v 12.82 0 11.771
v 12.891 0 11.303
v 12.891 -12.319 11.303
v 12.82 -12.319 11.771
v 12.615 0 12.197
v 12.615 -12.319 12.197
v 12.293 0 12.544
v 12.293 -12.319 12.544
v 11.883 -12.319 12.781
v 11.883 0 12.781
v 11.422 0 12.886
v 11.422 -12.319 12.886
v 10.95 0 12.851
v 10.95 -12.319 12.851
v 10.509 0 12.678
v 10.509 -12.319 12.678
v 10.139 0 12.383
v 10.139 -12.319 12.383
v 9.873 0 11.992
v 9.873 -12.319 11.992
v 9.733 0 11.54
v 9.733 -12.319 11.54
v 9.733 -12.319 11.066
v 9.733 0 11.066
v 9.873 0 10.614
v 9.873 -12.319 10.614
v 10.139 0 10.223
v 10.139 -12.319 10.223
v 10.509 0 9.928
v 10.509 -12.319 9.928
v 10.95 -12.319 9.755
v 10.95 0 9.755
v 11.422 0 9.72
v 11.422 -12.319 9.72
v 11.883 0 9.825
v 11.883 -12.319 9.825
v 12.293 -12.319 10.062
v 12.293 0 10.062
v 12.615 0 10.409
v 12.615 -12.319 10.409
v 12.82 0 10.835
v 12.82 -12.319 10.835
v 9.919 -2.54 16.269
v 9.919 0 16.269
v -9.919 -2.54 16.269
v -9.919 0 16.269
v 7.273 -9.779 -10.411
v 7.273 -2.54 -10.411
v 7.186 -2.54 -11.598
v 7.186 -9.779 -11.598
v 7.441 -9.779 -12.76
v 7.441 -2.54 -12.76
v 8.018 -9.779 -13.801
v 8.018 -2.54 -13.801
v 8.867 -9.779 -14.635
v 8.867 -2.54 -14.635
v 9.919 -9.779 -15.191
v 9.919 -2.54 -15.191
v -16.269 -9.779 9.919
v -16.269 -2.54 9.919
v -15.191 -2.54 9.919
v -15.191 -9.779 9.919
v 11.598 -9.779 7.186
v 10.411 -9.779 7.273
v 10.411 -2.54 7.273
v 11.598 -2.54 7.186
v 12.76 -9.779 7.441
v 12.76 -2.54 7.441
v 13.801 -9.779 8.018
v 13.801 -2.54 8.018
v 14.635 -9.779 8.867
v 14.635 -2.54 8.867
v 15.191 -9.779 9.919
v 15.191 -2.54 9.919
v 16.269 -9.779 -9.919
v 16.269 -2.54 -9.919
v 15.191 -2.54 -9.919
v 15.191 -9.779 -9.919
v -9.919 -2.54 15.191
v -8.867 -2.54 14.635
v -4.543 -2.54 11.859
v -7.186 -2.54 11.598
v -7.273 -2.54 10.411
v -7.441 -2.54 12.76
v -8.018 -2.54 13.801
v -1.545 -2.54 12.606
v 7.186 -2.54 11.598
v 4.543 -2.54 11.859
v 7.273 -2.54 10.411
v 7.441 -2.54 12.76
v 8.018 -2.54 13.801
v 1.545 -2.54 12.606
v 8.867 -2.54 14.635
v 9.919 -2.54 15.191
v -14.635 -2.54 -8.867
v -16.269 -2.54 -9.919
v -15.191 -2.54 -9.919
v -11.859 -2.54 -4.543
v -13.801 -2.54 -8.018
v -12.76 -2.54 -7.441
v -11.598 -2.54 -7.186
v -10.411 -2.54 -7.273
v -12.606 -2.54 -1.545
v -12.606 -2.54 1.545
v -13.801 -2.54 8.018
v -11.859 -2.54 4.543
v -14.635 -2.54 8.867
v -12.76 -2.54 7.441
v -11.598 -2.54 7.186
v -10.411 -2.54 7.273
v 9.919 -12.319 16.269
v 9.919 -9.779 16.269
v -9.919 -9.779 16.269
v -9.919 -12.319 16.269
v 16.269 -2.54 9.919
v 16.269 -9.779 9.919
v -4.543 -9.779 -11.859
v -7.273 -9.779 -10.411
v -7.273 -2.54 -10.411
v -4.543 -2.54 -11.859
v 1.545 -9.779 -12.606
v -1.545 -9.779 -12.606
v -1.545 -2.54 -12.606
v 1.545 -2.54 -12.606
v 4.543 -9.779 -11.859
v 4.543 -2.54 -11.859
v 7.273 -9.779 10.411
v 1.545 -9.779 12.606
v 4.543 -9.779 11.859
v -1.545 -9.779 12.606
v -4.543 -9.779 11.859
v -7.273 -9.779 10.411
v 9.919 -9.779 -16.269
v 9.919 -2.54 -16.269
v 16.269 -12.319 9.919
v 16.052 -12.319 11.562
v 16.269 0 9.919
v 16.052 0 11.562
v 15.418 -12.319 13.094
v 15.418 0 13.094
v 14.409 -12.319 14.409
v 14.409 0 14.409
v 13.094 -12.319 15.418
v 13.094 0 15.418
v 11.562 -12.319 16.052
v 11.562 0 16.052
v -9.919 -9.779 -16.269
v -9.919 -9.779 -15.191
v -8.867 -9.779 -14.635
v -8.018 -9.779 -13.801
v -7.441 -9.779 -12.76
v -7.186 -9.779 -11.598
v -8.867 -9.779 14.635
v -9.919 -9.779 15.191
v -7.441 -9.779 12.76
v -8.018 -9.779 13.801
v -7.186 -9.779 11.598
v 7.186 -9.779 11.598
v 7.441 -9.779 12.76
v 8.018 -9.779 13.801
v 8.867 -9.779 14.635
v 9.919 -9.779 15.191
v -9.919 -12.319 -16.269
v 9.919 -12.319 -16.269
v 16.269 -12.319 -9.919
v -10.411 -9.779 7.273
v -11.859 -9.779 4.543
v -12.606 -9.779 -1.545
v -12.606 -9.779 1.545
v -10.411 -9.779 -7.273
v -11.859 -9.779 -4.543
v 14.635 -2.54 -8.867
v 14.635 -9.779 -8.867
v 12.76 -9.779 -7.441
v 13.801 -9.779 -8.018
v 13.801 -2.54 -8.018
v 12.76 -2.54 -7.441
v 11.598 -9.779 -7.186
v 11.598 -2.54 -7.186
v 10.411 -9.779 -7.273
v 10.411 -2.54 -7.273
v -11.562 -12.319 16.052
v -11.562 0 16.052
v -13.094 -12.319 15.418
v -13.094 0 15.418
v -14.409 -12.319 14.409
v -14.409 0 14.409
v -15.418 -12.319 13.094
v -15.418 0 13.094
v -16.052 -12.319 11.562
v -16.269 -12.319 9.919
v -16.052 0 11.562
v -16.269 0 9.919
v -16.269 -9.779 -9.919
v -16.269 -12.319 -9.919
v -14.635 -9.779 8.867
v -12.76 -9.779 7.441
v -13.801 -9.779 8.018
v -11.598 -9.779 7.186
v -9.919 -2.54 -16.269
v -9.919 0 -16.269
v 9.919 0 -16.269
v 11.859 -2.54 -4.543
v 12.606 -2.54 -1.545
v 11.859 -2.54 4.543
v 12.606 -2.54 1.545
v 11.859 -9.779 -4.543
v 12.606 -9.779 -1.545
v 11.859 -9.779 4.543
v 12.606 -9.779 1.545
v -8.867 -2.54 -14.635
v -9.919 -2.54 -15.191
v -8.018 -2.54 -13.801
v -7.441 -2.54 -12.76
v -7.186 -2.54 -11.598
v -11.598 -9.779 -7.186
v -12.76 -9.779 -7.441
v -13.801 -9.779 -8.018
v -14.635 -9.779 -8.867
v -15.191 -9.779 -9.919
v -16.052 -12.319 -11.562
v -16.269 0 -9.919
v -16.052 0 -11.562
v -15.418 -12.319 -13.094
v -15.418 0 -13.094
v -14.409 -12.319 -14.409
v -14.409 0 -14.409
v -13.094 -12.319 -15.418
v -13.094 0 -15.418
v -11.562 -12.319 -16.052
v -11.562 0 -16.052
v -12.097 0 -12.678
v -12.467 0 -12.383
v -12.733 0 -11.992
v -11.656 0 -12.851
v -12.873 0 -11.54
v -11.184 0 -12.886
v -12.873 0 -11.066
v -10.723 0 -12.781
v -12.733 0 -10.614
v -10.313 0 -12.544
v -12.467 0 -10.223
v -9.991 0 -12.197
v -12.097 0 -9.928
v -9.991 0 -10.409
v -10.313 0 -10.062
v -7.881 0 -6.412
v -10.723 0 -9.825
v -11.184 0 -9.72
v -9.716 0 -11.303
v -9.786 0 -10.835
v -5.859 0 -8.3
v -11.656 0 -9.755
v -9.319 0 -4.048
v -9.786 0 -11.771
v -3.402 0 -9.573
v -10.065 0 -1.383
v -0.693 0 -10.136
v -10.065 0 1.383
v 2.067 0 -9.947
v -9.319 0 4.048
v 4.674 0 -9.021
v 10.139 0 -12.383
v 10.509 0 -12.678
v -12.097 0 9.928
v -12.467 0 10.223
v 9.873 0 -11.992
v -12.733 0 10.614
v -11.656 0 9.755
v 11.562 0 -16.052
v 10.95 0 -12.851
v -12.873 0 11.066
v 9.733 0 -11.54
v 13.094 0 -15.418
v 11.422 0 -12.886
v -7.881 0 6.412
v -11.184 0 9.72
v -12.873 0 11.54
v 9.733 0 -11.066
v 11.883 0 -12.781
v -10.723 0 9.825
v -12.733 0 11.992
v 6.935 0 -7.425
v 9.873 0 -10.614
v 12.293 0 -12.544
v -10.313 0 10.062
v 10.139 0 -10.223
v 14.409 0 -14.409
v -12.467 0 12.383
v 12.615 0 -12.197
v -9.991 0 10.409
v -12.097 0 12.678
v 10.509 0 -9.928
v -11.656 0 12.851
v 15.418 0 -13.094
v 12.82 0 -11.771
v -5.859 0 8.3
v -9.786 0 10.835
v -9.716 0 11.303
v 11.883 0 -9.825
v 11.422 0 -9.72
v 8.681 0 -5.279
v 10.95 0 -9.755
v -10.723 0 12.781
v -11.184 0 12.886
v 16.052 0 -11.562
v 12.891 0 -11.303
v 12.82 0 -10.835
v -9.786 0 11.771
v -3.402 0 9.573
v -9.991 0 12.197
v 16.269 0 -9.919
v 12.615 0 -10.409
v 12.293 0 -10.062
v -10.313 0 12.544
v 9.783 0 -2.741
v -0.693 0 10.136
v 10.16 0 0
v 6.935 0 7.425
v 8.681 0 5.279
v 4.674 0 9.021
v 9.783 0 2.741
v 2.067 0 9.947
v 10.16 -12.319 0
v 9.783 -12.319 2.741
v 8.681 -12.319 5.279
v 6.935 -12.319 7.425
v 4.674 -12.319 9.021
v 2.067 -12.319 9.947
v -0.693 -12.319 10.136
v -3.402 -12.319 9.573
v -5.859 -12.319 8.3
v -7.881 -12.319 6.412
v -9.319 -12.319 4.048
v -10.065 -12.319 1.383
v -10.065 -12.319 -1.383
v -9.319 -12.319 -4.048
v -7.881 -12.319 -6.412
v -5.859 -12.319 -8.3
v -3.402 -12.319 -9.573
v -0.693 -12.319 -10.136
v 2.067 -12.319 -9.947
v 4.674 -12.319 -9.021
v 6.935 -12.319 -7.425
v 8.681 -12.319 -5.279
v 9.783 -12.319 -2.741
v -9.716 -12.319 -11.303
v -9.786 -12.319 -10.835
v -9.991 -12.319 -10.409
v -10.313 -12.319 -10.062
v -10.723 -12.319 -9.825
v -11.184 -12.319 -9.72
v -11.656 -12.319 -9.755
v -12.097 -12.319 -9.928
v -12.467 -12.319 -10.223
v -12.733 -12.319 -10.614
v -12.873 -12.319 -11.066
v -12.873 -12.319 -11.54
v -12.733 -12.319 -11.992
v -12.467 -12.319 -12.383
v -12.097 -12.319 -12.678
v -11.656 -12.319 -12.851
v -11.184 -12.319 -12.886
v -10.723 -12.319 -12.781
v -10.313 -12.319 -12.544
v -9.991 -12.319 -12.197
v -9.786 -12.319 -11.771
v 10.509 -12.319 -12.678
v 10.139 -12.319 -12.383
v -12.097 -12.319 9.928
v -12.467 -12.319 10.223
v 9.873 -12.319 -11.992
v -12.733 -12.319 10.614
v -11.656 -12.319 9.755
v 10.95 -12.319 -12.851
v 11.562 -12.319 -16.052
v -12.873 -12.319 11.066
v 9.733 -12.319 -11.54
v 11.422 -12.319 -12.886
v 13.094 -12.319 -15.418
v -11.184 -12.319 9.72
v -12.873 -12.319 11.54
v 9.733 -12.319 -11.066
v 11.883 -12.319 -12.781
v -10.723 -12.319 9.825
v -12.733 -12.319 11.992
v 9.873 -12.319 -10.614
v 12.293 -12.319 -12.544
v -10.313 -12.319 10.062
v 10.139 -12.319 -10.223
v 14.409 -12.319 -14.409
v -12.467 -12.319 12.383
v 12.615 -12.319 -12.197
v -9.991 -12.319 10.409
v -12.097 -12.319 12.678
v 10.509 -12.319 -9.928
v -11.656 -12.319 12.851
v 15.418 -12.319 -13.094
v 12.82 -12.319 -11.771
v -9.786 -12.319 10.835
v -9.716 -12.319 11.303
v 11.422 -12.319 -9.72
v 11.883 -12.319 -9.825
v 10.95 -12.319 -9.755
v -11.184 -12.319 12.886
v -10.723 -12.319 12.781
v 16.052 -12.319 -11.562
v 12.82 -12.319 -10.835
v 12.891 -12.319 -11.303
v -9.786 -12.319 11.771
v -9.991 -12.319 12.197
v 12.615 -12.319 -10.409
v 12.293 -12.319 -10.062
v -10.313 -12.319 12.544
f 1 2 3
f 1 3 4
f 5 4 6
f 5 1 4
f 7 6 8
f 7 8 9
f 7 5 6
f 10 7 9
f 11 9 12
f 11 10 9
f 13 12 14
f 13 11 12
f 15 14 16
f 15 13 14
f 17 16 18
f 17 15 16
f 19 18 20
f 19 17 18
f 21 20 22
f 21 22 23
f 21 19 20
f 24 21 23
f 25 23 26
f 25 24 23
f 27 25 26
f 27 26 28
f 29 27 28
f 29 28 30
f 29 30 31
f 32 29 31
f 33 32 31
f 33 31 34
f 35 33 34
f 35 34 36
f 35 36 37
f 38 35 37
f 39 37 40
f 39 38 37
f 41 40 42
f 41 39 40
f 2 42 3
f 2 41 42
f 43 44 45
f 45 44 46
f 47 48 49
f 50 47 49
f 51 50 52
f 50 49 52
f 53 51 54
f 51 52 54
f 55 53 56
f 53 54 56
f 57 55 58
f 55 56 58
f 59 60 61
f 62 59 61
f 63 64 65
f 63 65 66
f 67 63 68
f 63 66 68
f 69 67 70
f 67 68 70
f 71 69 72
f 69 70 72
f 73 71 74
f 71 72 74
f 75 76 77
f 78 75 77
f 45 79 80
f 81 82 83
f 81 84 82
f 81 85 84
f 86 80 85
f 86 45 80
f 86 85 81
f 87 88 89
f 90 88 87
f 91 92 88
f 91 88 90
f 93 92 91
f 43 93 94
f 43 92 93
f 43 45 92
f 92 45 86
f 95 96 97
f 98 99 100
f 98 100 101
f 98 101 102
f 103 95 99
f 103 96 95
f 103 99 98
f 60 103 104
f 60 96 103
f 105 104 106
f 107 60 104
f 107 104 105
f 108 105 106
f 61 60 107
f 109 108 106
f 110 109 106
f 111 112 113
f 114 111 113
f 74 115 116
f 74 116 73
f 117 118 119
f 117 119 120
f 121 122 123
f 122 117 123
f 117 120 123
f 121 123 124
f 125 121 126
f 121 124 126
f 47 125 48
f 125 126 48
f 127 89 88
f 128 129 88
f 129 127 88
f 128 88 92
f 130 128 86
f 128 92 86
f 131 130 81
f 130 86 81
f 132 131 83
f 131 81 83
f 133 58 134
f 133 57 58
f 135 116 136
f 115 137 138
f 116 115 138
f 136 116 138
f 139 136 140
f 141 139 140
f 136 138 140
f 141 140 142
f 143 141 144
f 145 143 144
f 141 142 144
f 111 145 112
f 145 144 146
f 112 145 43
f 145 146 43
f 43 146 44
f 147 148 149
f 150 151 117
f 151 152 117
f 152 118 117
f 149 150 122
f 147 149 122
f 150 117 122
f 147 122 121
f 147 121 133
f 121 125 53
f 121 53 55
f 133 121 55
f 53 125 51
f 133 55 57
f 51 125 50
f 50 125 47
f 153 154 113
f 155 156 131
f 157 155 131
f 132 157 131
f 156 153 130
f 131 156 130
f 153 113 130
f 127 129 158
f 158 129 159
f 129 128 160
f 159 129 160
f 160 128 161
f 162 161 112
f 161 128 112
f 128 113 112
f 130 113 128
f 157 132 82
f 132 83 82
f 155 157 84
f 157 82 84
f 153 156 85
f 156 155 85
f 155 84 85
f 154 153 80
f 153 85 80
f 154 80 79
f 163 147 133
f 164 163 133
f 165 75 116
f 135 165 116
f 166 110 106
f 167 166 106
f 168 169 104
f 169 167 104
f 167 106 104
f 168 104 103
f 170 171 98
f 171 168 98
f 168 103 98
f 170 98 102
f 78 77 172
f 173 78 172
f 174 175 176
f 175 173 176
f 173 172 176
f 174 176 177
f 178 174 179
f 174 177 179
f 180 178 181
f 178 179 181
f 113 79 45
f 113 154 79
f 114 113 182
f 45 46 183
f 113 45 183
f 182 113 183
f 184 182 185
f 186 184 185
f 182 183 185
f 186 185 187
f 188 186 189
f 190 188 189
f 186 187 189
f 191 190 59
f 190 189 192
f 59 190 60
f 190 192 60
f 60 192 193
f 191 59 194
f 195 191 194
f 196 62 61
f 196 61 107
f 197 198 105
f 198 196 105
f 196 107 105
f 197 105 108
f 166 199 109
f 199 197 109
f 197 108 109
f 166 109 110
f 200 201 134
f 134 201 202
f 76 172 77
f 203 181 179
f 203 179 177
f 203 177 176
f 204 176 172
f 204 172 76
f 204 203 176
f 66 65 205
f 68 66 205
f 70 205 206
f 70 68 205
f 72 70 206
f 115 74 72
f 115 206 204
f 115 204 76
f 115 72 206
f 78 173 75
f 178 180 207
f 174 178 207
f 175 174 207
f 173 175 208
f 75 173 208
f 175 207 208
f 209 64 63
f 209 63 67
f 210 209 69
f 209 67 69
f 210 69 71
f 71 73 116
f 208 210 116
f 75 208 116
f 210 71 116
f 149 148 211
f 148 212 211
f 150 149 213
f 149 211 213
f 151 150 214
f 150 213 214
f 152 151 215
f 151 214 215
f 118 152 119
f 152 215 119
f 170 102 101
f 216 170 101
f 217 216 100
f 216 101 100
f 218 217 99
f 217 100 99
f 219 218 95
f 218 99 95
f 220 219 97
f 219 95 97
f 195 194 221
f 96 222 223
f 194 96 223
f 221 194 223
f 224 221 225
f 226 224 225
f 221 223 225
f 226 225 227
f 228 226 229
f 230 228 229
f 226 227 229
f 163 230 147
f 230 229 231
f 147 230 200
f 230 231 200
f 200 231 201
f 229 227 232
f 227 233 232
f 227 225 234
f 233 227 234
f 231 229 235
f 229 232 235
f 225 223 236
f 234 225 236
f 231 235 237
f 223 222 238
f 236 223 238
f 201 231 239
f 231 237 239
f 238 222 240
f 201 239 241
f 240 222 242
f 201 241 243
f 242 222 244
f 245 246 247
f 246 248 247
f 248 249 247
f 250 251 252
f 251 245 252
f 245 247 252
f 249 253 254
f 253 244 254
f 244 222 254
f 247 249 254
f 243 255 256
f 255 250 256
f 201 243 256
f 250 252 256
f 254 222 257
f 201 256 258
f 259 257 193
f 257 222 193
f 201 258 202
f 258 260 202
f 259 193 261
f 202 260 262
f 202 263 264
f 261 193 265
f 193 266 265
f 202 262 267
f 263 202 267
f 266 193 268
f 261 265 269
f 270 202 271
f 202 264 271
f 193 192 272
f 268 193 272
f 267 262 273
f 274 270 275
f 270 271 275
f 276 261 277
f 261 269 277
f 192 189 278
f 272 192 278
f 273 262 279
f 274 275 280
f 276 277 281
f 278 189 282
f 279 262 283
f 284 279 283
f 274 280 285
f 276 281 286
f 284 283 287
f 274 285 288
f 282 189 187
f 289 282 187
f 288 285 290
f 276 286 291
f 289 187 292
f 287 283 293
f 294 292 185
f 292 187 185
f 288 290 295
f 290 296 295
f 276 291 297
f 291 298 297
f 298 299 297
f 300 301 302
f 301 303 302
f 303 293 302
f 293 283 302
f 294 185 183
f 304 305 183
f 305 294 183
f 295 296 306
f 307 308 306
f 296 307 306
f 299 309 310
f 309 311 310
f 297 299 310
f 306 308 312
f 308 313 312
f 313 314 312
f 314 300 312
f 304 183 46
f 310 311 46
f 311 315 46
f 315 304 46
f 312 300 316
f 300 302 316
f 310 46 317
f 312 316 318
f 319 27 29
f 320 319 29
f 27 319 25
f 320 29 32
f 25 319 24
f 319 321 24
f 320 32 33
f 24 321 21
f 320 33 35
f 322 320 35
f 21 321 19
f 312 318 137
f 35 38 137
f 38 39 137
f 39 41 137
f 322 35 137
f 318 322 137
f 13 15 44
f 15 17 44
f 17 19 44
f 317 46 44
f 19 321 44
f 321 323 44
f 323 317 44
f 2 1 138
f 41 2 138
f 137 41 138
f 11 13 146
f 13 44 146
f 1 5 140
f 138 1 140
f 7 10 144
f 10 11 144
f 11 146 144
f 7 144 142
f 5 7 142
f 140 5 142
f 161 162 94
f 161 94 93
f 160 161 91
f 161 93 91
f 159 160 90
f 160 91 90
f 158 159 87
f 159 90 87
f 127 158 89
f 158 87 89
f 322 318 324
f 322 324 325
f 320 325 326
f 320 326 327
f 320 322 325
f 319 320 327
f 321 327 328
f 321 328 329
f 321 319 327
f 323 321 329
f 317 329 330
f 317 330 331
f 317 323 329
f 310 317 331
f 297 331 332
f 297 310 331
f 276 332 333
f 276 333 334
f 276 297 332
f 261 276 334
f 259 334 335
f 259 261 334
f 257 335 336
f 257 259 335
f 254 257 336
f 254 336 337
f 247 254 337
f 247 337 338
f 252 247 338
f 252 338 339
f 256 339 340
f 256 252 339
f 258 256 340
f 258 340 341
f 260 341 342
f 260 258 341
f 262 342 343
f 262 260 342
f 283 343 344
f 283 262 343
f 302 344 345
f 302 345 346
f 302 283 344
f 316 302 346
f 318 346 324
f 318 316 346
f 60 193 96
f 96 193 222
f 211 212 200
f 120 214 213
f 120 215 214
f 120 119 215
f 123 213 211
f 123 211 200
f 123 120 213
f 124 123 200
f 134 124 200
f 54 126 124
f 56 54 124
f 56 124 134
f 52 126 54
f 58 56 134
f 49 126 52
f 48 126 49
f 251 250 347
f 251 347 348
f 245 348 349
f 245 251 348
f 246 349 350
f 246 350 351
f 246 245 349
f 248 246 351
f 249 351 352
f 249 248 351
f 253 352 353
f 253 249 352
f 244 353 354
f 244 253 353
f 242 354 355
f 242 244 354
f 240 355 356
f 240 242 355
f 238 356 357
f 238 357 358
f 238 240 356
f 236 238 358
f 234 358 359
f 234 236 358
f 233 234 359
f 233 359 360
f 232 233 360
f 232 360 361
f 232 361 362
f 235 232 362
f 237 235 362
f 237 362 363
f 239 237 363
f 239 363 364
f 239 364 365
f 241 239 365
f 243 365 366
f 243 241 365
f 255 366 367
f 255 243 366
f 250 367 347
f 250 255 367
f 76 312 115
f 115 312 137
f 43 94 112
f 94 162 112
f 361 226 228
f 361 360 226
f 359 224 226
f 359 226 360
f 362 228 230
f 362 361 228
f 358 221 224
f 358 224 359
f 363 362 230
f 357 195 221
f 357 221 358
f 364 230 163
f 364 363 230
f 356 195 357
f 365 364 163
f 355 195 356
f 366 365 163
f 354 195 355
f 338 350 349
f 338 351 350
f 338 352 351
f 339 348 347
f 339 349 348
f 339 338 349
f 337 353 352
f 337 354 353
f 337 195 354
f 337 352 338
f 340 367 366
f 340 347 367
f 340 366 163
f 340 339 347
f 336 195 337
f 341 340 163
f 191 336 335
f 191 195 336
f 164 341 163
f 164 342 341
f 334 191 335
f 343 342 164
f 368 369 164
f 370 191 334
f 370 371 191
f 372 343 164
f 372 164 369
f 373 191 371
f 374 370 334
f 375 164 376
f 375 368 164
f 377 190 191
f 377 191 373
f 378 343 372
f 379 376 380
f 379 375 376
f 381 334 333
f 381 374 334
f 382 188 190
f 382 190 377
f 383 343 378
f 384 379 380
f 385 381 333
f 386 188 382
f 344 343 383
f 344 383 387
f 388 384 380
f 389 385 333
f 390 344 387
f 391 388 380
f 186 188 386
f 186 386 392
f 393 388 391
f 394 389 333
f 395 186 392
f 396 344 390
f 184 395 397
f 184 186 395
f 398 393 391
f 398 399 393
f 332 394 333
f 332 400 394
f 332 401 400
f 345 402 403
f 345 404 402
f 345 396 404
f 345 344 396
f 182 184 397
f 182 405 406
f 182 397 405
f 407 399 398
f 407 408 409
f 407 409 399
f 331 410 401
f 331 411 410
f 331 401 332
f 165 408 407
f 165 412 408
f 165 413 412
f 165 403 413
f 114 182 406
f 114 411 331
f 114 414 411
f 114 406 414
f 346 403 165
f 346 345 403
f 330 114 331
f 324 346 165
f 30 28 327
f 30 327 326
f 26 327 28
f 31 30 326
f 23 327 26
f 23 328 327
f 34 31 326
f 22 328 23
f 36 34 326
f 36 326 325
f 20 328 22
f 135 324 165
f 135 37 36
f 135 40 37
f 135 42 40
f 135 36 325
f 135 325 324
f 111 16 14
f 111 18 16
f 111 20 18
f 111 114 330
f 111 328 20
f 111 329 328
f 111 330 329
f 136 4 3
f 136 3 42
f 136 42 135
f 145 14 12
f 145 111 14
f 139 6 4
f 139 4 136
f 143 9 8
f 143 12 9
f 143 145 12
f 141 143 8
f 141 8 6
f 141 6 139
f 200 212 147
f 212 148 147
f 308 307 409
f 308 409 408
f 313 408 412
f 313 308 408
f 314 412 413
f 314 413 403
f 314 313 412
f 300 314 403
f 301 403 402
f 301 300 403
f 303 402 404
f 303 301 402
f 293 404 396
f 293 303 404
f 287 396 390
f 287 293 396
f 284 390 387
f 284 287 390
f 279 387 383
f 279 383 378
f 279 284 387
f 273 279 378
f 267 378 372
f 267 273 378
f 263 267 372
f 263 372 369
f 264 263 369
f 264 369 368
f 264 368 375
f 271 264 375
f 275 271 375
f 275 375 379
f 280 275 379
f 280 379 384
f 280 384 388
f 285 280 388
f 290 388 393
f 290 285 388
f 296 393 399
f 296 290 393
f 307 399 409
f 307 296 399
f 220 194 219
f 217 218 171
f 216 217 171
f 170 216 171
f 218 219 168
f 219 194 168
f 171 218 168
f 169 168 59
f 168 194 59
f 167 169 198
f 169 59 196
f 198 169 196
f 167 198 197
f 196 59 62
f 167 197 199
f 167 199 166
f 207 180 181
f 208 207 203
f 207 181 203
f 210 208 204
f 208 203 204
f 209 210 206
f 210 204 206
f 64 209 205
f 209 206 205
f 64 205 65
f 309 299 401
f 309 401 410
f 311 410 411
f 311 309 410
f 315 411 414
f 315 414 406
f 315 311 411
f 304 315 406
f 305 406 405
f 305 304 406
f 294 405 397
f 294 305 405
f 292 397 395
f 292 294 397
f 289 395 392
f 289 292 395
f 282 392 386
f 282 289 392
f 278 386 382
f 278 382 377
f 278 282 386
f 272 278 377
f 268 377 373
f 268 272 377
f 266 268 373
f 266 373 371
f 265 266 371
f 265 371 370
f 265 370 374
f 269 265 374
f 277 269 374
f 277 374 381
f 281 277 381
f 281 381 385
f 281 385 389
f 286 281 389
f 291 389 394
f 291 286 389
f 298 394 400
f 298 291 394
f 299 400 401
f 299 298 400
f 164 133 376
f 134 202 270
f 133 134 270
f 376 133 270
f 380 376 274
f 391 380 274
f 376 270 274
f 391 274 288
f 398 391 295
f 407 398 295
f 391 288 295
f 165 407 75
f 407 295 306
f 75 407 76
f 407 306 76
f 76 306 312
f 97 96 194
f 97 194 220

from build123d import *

# Parameters (mm, degrees)
F0_R     = 1.5875
F0_R_2   = 10.16
F1_DEPTH = 12.319
F2_T     = 2.54


# Not quite as in the source:
# - a shell that OpenCascade refuses in one call is made with other operations: the cavity is built on its own and cut out


with BuildPart() as f1:
    # F0 (on Front) → F1 (new body)
    with BuildSketch(Plane.XZ):
        with BuildLine():
            Line((9.9187, 16.2687), (-9.9187, 16.2687))
            ThreePointArc((-9.9187, 16.2687), (-14.4088280605, 14.4088280605), (-16.2687, 9.9187))
            Line((-16.2687, 9.9187), (-16.2687, -9.9187))
            ThreePointArc((-16.2687, -9.9187), (-14.4088280605, -14.4088280605), (-9.9187, -16.2687))
            Line((-9.9187, -16.2687), (9.9187, -16.2687))
            ThreePointArc((9.9187, -16.2687), (14.4088280605, -14.4088280605), (16.2687, -9.9187))
            Line((16.2687, -9.9187), (16.2687, 9.9187))
            ThreePointArc((16.2687, 9.9187), (14.4088280605, 14.4088280605), (9.9187, 16.2687))
        make_face()
        with Locations((-11.303, -11.303)):
            Circle(F0_R, mode=Mode.SUBTRACT)
        with Locations((11.303, -11.303)):
            Circle(F0_R, mode=Mode.SUBTRACT)
        Circle(F0_R_2, mode=Mode.SUBTRACT)
        with Locations((-11.303, 11.303)):
            Circle(F0_R, mode=Mode.SUBTRACT)
        with Locations((11.303, 11.303)):
            Circle(F0_R, mode=Mode.SUBTRACT)
    extrude(amount=F1_DEPTH)

    # F2: shell of thickness 2.54, made by hand


with BuildPart() as f2_core1:
    # F2_t2: copy of F1
    add(f1.part)

    # the walls: a layer under each face that stays
    f2_faces = [f2_core1.faces().sort_by_distance(p)[0] for p in [
        (14.4088280605, -6.1595, 14.4088280605),
        (-14.4088280605, -6.1595, 14.4088280605),
        (-14.4088280605, -6.1595, -14.4088280605),
        (14.4088280605, -6.1595, -14.4088280605),
        (-12.8905, -6.1595, -11.303),
        (9.7155, -6.1595, -11.303),
        (-10.16, -6.1595, 0),
        (-12.8905, -6.1595, 11.303),
        (9.7155, -6.1595, 11.303),
        (-10.8458, 0, 0),
        (-10.8458, -12.319, 0),
    ]]
    thicken(f2_faces, amount=-F2_T, mode=Mode.SUBTRACT)


with BuildPart() as f1_1:
    add(f1.part)

    # what is left inside the walls is the cavity
    f2_cavity = [f2_core1.part.solids().sort_by_distance(p)[0] for p in [
        (16.2433, -7.366, 0),
        (0, -7.366, 16.2433),
        (0, -7.366, -16.2433),
        (-16.2433, -7.366, 0),
    ]]
    add(f2_cavity, mode=Mode.SUBTRACT)


solid = f1_1.part
